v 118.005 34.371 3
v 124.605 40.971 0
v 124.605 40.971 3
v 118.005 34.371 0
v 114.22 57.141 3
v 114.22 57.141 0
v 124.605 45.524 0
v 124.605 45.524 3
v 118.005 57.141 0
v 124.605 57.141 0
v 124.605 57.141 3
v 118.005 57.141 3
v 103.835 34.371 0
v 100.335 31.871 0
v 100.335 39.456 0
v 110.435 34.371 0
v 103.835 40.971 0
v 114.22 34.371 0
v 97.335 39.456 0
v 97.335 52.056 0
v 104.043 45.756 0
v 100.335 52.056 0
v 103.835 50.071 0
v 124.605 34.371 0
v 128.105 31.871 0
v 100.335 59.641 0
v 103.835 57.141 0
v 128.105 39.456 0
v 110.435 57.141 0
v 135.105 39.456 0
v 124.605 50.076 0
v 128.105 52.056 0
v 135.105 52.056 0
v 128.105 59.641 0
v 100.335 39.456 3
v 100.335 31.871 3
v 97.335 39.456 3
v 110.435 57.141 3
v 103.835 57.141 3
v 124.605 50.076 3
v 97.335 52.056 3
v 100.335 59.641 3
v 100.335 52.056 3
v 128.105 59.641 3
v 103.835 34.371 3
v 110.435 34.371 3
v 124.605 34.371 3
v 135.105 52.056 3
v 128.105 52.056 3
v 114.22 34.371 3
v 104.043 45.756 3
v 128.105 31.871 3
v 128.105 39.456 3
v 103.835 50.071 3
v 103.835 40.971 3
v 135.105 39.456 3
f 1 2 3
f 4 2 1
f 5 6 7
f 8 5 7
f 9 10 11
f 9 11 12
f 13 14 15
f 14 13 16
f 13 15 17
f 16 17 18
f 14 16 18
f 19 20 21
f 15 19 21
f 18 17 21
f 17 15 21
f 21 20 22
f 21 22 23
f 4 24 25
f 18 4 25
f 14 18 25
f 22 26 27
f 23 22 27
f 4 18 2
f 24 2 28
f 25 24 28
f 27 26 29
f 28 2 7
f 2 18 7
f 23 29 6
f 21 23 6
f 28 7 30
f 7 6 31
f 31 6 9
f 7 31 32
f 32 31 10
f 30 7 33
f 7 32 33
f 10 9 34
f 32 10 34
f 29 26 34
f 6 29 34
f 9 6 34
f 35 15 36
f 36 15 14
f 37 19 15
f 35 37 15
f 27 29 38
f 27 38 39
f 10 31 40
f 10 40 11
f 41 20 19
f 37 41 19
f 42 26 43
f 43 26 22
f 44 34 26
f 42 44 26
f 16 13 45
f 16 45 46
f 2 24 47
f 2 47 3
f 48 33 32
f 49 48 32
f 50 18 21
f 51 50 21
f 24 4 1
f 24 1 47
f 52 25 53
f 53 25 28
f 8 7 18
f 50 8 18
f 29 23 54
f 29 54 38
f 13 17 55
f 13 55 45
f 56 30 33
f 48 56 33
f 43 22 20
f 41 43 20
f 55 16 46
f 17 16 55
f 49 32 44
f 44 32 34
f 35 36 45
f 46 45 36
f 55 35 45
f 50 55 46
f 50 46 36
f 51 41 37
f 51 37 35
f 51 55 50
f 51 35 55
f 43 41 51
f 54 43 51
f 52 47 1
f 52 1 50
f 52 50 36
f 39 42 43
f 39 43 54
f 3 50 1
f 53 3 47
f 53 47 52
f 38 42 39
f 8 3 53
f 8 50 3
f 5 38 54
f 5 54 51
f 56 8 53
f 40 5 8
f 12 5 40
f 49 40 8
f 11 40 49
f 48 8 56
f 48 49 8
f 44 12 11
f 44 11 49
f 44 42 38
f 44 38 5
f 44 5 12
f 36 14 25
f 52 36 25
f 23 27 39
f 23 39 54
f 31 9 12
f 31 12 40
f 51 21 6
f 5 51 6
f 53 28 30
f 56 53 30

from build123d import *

# Parameters (mm, degrees)
SALIENTE_EXTRUIR1_DEPTH = 3


with BuildPart() as part:
    # Croquis1 → Saliente-Extruir1 (new body)
    with BuildSketch(Plane.XY):
        Polygon((97.334837859, 52.056418279), (97.334837859, 39.456418279), (100.334837859, 39.456418279), (100.334837859, 31.871418279), (128.104837859, 31.871418279), (128.104837859, 39.456418279), (135.104837859, 39.456418279), (135.104837859, 52.056418279), (128.104837859, 52.056418279), (128.104837859, 59.641418279), (100.334837859, 59.641418279), (100.334837859, 52.056418279), align=None)
        Polygon((110.434837859, 57.141418279), (103.834837859, 57.141418279), (103.834837859, 50.071418279), align=None, mode=Mode.SUBTRACT)
        Polygon((103.834837859, 40.971418279), (103.834837859, 34.371418279), (110.434837859, 34.371418279), align=None, mode=Mode.SUBTRACT)
        Polygon((118.004837859, 34.371418279), (124.604837859, 34.371418279), (124.604837859, 40.971418279), align=None, mode=Mode.SUBTRACT)
        Polygon((124.604837859, 50.076418279), (124.604837859, 57.141418279), (118.004837859, 57.141418279), align=None, mode=Mode.SUBTRACT)
        Polygon((114.219837859, 57.141418279), (124.604837859, 45.523918279), (114.219837859, 34.371418279), (104.042671946, 45.756418279), align=None, mode=Mode.SUBTRACT)
    extrude(amount=SALIENTE_EXTRUIR1_DEPTH)


solid = part.part
